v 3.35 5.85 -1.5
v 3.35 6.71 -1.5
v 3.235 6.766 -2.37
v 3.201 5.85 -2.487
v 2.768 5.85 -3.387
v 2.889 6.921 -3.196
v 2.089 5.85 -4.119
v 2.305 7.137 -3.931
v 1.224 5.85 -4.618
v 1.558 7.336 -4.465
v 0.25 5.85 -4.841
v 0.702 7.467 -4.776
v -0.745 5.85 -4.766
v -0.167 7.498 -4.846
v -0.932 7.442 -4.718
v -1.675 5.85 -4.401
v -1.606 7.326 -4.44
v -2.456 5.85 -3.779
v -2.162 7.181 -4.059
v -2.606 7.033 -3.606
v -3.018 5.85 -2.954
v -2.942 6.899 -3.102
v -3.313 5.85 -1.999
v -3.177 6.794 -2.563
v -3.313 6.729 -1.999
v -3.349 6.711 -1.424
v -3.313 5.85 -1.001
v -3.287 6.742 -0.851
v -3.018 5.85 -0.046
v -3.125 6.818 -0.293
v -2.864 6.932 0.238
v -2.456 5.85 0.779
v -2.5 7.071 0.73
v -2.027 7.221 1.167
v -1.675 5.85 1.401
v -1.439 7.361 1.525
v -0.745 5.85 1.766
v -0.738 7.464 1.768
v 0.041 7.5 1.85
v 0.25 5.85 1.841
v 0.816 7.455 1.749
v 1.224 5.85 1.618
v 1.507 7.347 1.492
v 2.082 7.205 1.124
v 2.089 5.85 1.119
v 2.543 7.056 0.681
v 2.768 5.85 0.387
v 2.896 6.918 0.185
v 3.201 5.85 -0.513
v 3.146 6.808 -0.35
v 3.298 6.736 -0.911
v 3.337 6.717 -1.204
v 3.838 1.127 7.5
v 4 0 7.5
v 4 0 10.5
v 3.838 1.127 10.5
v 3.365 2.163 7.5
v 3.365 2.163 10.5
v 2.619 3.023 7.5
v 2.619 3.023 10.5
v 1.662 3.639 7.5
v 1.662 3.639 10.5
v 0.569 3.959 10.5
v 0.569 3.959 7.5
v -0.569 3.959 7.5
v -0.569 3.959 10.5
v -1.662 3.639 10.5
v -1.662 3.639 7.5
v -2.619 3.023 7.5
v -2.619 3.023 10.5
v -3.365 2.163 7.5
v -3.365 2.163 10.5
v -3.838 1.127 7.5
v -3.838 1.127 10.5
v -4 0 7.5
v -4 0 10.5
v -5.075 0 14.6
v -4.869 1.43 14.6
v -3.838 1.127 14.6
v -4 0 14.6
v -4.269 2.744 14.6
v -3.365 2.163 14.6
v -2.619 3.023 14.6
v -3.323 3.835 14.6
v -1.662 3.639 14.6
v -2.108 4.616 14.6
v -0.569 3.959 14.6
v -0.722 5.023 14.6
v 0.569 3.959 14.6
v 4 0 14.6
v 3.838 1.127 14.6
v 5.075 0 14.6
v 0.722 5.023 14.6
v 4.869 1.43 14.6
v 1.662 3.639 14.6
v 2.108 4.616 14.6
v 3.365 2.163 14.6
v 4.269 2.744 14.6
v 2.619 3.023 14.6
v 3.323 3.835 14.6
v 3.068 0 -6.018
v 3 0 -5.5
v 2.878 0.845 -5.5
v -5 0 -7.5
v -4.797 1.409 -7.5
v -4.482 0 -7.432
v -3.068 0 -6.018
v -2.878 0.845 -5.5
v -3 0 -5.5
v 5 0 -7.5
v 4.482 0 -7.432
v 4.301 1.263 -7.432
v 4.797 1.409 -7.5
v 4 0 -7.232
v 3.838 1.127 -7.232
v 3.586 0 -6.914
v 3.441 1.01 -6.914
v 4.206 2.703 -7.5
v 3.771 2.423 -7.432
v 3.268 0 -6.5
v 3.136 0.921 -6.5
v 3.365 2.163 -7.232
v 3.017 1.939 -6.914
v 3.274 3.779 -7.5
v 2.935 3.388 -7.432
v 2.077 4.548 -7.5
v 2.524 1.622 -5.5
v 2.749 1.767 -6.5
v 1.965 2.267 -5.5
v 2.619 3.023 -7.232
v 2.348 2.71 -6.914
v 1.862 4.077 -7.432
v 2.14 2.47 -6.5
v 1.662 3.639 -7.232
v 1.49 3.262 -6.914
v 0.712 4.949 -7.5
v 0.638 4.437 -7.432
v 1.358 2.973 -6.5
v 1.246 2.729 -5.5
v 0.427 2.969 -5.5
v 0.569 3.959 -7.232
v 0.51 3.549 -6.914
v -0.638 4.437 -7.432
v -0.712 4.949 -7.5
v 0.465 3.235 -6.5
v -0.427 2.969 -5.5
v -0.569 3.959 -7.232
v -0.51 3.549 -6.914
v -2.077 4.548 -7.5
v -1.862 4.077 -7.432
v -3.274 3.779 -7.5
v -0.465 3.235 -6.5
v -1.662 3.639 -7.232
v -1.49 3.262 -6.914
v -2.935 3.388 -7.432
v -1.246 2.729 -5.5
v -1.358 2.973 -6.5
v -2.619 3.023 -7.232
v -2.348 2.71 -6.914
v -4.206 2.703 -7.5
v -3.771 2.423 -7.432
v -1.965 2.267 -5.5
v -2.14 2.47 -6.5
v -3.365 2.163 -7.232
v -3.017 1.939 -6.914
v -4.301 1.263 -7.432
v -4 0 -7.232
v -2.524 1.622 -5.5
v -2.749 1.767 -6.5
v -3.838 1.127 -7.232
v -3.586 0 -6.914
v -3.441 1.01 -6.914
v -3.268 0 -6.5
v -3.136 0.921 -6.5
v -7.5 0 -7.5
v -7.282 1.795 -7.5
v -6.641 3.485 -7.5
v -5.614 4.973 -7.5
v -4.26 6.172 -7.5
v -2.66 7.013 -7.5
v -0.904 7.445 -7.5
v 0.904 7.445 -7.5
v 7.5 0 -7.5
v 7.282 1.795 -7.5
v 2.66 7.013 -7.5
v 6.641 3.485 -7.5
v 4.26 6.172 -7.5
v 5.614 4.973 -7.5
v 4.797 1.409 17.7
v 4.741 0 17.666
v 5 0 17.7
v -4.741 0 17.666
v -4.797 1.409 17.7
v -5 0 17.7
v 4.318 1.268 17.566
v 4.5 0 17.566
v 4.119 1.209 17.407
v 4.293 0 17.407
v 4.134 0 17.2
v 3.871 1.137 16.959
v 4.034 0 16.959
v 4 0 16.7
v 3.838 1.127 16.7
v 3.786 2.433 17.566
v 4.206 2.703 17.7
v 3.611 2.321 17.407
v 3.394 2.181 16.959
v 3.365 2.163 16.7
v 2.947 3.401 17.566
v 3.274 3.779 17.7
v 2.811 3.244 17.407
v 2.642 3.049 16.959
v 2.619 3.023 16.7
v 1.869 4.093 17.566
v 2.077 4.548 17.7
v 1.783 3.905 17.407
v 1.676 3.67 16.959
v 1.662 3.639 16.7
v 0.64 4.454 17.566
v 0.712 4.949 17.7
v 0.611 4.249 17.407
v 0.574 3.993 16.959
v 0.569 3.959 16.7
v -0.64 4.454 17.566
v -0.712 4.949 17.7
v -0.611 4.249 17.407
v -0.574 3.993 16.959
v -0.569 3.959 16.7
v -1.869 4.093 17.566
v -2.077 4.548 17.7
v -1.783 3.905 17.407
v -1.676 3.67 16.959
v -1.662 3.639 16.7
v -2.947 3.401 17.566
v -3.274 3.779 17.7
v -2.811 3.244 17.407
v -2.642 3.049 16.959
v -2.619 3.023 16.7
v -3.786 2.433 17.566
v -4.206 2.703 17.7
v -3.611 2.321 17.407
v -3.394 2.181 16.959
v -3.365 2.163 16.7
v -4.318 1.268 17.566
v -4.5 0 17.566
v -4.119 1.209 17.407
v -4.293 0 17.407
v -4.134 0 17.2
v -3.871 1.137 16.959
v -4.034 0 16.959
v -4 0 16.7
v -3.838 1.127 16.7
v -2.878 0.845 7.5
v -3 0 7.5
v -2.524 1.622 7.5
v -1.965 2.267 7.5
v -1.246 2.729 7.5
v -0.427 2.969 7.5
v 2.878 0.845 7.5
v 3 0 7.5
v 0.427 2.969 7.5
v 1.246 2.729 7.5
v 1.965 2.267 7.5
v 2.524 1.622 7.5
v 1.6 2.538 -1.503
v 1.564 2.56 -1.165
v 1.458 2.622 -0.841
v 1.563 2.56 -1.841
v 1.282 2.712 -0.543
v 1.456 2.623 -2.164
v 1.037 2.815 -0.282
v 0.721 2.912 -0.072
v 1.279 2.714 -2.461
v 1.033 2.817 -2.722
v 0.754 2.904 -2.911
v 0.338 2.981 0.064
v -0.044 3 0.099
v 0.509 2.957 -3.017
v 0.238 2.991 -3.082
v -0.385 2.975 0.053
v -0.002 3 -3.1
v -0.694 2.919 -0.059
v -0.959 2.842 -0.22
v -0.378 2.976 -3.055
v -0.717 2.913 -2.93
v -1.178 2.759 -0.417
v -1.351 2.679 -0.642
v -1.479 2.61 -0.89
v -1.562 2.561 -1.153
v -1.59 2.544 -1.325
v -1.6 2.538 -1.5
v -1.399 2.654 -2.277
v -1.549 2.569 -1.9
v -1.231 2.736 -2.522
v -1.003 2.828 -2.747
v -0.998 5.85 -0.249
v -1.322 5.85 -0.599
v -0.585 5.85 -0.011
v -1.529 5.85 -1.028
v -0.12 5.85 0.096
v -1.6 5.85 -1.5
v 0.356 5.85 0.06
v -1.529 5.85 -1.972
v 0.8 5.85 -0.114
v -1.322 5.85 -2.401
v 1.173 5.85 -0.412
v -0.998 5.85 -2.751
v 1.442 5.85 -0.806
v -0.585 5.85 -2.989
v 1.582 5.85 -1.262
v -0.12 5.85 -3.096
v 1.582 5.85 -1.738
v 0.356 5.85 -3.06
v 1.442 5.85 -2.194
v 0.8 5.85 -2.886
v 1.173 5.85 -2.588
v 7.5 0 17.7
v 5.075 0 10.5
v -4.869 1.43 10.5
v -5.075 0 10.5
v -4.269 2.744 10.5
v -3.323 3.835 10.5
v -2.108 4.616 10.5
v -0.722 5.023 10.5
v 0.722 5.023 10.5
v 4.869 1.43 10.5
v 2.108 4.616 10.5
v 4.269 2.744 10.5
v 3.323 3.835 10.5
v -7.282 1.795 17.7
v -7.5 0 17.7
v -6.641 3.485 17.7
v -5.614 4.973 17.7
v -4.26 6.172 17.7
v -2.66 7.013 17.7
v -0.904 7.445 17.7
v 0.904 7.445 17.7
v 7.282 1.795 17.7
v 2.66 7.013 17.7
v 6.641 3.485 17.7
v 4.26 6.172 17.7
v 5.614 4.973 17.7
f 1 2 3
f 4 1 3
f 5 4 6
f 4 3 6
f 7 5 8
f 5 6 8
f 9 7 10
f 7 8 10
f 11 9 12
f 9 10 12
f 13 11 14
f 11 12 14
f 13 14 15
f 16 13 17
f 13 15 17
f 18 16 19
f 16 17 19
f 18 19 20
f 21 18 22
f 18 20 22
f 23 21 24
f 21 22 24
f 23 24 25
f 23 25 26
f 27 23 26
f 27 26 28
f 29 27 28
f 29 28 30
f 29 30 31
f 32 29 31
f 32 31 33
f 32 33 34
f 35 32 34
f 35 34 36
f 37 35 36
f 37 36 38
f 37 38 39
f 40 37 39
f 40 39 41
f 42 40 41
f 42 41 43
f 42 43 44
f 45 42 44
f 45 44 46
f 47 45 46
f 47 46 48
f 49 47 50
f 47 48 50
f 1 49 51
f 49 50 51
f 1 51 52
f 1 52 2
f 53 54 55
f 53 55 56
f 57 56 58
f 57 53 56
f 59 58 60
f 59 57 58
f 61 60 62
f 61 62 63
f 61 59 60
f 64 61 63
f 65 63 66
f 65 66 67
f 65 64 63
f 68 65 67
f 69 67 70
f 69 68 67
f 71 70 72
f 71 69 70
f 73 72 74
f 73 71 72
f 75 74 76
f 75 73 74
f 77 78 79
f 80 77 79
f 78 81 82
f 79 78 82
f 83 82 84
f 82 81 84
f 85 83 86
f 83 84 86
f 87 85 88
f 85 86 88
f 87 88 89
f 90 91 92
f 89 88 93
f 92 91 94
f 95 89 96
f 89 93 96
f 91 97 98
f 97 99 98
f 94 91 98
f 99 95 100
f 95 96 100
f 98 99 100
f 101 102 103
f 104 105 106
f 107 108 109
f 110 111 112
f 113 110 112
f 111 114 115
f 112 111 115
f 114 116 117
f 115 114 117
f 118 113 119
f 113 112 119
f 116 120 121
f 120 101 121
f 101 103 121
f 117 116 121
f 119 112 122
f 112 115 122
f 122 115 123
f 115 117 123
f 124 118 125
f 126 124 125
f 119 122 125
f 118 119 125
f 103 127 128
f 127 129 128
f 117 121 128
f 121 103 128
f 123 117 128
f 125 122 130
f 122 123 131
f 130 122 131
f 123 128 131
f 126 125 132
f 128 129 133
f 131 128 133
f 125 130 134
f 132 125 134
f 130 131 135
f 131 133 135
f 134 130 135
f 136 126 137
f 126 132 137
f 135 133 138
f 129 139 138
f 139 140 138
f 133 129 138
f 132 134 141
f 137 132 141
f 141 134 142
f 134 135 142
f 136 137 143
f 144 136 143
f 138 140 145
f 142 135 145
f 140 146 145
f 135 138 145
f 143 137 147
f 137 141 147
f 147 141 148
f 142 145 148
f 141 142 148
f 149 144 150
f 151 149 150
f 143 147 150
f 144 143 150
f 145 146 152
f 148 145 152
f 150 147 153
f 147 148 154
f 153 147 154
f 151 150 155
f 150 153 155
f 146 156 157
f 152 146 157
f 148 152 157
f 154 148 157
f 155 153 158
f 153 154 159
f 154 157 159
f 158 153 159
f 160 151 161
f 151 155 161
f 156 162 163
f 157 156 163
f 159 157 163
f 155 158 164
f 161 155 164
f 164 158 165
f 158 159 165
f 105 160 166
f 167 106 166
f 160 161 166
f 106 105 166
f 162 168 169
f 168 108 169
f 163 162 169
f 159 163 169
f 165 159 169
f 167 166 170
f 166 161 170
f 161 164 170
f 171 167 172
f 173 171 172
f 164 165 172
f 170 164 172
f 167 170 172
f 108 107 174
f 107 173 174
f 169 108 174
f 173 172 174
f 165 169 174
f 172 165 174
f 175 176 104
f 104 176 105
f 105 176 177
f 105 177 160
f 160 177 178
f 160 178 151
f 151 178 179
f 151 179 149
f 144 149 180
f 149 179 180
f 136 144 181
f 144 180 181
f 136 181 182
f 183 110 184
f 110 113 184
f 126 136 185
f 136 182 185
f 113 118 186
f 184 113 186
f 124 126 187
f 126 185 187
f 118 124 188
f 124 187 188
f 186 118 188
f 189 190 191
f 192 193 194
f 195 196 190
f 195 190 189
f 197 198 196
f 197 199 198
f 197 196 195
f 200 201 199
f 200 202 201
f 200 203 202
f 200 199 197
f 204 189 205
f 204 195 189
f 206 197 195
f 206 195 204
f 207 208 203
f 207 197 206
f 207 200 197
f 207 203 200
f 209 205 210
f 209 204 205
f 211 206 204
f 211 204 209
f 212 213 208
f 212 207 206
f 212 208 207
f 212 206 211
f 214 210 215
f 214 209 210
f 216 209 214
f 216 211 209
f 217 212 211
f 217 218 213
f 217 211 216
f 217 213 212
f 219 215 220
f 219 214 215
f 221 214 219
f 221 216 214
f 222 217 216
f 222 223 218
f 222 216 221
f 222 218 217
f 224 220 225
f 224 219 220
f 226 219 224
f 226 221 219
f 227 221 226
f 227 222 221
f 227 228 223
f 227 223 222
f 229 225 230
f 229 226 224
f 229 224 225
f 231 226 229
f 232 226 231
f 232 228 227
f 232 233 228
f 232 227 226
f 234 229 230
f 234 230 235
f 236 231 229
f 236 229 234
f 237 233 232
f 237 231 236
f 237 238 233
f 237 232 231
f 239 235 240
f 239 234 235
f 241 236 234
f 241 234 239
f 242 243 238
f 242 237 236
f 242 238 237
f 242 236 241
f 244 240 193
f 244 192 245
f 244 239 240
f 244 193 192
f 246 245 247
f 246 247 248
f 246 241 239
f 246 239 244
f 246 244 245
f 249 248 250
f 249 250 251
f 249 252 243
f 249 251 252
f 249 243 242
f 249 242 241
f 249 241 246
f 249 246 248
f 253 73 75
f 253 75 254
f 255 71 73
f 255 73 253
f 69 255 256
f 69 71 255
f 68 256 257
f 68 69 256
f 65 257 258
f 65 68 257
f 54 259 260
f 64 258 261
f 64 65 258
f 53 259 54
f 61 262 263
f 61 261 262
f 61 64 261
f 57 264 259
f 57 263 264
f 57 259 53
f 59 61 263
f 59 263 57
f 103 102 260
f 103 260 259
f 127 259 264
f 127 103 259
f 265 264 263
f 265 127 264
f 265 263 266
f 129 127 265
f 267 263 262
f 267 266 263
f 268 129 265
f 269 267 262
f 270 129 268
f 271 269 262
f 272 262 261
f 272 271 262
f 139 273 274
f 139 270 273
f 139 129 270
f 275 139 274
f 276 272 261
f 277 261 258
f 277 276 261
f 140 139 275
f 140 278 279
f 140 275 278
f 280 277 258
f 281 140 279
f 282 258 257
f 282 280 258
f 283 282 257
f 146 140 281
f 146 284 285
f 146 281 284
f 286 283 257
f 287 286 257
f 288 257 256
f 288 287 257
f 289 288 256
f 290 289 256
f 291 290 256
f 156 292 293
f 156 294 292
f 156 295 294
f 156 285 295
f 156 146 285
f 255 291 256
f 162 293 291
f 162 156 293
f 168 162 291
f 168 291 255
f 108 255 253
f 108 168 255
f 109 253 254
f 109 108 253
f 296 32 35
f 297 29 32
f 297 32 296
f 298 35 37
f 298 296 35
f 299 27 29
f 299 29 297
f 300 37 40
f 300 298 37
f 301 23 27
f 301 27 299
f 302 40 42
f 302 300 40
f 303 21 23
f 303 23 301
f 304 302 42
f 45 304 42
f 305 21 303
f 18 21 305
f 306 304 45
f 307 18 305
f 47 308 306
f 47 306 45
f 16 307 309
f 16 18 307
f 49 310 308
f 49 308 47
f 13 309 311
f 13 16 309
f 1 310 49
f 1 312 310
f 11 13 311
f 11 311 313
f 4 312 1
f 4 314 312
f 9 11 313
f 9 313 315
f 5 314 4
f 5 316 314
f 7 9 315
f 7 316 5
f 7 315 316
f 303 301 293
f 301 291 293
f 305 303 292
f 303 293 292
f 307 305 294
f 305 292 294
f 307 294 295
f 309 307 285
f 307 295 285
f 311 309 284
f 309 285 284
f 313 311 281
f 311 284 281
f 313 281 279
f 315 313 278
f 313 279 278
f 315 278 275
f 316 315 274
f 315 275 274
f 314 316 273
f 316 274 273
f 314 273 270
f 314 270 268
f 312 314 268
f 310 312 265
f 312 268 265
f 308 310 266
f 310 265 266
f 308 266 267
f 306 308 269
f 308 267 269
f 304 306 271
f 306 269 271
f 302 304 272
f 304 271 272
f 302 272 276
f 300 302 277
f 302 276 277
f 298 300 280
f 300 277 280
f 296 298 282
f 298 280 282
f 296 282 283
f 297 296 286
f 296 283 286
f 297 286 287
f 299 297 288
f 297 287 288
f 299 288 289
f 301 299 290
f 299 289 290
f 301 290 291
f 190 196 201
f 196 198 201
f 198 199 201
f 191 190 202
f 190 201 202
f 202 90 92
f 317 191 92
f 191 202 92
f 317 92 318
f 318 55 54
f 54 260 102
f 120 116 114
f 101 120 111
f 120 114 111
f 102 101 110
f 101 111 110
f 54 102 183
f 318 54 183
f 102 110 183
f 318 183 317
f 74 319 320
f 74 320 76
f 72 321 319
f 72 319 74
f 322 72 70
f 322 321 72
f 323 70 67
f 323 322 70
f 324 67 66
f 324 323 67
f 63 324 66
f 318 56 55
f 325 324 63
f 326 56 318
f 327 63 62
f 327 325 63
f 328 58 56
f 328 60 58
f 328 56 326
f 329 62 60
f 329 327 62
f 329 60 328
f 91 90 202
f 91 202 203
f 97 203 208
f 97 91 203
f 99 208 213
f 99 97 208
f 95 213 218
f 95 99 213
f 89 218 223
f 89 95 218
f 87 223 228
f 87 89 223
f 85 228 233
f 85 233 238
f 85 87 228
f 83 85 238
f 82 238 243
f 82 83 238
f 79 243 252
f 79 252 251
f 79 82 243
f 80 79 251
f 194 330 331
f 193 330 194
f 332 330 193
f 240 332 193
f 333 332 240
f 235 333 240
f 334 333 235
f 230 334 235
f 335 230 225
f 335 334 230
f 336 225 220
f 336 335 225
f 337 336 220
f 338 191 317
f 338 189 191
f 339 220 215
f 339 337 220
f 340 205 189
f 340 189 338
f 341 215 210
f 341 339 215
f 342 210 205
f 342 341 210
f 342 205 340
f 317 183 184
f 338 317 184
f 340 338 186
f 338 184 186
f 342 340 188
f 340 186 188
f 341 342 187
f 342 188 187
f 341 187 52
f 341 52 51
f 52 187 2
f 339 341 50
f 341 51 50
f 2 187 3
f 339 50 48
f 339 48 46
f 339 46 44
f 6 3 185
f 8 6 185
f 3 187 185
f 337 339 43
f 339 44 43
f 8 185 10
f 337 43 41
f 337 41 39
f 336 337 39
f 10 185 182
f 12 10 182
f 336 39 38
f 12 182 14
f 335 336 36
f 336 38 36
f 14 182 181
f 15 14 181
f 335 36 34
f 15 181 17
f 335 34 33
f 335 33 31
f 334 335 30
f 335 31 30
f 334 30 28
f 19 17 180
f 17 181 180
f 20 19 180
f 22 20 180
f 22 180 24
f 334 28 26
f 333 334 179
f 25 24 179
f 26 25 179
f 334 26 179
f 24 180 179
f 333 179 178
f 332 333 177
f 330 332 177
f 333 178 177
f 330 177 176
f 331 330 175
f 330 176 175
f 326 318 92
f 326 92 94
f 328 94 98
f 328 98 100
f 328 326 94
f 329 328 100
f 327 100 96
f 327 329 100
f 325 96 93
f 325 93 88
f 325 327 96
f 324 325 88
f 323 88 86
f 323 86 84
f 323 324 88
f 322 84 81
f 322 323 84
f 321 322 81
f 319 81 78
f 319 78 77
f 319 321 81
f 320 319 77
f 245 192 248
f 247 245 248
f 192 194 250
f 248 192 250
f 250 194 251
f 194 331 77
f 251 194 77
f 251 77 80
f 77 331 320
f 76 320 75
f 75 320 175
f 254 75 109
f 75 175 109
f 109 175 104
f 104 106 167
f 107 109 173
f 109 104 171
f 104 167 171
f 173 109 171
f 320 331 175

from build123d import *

# Parameters (mm, degrees)
SKETCH1_R                       = 7.5
SKETCH1_R_2                     = 3
BOSS_EXTRUDE1_DEPTH             = 7.5
SKETCH2_R                       = 7.5
SKETCH2_R_2                     = 3
BOSS_EXTRUDE2_DEPTH             = 1
SKETCH3_R                       = 7.5
SKETCH3_R_2                     = 4
BOSS_EXTRUDE3_DEPTH             = 3
SKETCH4_R                       = 7.5
SKETCH4_R_2                     = 5.075
BOSS_EXTRUDE4_DEPTH             = 4.1
SKETCH5_R                       = 7.5
SKETCH5_R_2                     = 4
BOSS_EXTRUDE5_DEPTH             = 3.1
CBORE_FOR_M3_SBHCS1_D           = 3.2
CBORE_FOR_M3_SBHCS1_DEPTH       = 10
CBORE_FOR_M3_SBHCS1_CBORE_D     = 6.7
CBORE_FOR_M3_SBHCS1_CBORE_DEPTH = 1.65
CBORE_FOR_M3_SBHCS1_TIP         = 0.96137699
SKETCH9_W                       = 15
SKETCH9_H                       = 25.2
CUT_EXTRUDE2_DEPTH              = 8.5000001
FILLET1_R                       = 1
FILLET2_R                       = 2


with BuildPart() as part:
    # Sketch1 → Boss-Extrude1 (new body, symmetric)
    with BuildSketch(Plane.XY):
        Circle(SKETCH1_R)
        Circle(SKETCH1_R_2, mode=Mode.SUBTRACT)
    extrude(amount=BOSS_EXTRUDE1_DEPTH, both=True)

    # Sketch2 → Boss-Extrude2 (add)
    with BuildSketch(Plane.XY.offset(7.5)):
        Circle(SKETCH2_R)
        Circle(SKETCH2_R_2, mode=Mode.SUBTRACT)
    extrude(amount=-BOSS_EXTRUDE2_DEPTH)

    # Sketch3 → Boss-Extrude3 (add)
    with BuildSketch(Plane.XY.offset(7.5)):
        Circle(SKETCH3_R)
        Circle(SKETCH3_R_2, mode=Mode.SUBTRACT)
    extrude(amount=BOSS_EXTRUDE3_DEPTH)

    # Sketch4 → Boss-Extrude4 (add)
    with BuildSketch(Plane.XY.offset(10.5)):
        Circle(SKETCH4_R)
        Circle(SKETCH4_R_2, mode=Mode.SUBTRACT)
    extrude(amount=BOSS_EXTRUDE4_DEPTH)

    # Sketch5 → Boss-Extrude5 (add)
    with BuildSketch(Plane.XY.offset(14.6)):
        Circle(SKETCH5_R)
        Circle(SKETCH5_R_2, mode=Mode.SUBTRACT)
    extrude(amount=BOSS_EXTRUDE5_DEPTH)

    # CBORE for M3 SBHCS1
    with Locations(Plane(origin=(0, 7.5, 0), x_dir=(1, 0, 0), z_dir=(0, 1, 0))):
        with Locations((0, 1.5)):
            CounterBoreHole(CBORE_FOR_M3_SBHCS1_D / 2, CBORE_FOR_M3_SBHCS1_CBORE_D / 2, CBORE_FOR_M3_SBHCS1_CBORE_DEPTH, depth=CBORE_FOR_M3_SBHCS1_DEPTH)
            with Locations((0, 0, -(CBORE_FOR_M3_SBHCS1_DEPTH + CBORE_FOR_M3_SBHCS1_TIP / 2))):  # 118° drill point
                Cone(0, CBORE_FOR_M3_SBHCS1_D / 2, CBORE_FOR_M3_SBHCS1_TIP, mode=Mode.SUBTRACT)

    # Sketch9 → Cut-Extrude2 (cut, through all)
    with BuildSketch(Plane(origin=(0, 0, 0), x_dir=(1, 0, 0), z_dir=(0, 1, 0))):
        with Locations((0, -5.1)):
            Rectangle(SKETCH9_W, SKETCH9_H)
    extrude(amount=-CUT_EXTRUDE2_DEPTH, mode=Mode.SUBTRACT)

    # Fillet1
    fillet1_edges = [part.edges().sort_by_distance(p)[0] for p in [
        (0, 4, 17.7),
    ]]
    fillet(fillet1_edges, radius=FILLET1_R)

    # Fillet2
    fillet2_edges = [part.edges().sort_by_distance(p)[0] for p in [
        (0, 3, -7.5),
    ]]
    fillet(fillet2_edges, radius=FILLET2_R)


solid = part.part
